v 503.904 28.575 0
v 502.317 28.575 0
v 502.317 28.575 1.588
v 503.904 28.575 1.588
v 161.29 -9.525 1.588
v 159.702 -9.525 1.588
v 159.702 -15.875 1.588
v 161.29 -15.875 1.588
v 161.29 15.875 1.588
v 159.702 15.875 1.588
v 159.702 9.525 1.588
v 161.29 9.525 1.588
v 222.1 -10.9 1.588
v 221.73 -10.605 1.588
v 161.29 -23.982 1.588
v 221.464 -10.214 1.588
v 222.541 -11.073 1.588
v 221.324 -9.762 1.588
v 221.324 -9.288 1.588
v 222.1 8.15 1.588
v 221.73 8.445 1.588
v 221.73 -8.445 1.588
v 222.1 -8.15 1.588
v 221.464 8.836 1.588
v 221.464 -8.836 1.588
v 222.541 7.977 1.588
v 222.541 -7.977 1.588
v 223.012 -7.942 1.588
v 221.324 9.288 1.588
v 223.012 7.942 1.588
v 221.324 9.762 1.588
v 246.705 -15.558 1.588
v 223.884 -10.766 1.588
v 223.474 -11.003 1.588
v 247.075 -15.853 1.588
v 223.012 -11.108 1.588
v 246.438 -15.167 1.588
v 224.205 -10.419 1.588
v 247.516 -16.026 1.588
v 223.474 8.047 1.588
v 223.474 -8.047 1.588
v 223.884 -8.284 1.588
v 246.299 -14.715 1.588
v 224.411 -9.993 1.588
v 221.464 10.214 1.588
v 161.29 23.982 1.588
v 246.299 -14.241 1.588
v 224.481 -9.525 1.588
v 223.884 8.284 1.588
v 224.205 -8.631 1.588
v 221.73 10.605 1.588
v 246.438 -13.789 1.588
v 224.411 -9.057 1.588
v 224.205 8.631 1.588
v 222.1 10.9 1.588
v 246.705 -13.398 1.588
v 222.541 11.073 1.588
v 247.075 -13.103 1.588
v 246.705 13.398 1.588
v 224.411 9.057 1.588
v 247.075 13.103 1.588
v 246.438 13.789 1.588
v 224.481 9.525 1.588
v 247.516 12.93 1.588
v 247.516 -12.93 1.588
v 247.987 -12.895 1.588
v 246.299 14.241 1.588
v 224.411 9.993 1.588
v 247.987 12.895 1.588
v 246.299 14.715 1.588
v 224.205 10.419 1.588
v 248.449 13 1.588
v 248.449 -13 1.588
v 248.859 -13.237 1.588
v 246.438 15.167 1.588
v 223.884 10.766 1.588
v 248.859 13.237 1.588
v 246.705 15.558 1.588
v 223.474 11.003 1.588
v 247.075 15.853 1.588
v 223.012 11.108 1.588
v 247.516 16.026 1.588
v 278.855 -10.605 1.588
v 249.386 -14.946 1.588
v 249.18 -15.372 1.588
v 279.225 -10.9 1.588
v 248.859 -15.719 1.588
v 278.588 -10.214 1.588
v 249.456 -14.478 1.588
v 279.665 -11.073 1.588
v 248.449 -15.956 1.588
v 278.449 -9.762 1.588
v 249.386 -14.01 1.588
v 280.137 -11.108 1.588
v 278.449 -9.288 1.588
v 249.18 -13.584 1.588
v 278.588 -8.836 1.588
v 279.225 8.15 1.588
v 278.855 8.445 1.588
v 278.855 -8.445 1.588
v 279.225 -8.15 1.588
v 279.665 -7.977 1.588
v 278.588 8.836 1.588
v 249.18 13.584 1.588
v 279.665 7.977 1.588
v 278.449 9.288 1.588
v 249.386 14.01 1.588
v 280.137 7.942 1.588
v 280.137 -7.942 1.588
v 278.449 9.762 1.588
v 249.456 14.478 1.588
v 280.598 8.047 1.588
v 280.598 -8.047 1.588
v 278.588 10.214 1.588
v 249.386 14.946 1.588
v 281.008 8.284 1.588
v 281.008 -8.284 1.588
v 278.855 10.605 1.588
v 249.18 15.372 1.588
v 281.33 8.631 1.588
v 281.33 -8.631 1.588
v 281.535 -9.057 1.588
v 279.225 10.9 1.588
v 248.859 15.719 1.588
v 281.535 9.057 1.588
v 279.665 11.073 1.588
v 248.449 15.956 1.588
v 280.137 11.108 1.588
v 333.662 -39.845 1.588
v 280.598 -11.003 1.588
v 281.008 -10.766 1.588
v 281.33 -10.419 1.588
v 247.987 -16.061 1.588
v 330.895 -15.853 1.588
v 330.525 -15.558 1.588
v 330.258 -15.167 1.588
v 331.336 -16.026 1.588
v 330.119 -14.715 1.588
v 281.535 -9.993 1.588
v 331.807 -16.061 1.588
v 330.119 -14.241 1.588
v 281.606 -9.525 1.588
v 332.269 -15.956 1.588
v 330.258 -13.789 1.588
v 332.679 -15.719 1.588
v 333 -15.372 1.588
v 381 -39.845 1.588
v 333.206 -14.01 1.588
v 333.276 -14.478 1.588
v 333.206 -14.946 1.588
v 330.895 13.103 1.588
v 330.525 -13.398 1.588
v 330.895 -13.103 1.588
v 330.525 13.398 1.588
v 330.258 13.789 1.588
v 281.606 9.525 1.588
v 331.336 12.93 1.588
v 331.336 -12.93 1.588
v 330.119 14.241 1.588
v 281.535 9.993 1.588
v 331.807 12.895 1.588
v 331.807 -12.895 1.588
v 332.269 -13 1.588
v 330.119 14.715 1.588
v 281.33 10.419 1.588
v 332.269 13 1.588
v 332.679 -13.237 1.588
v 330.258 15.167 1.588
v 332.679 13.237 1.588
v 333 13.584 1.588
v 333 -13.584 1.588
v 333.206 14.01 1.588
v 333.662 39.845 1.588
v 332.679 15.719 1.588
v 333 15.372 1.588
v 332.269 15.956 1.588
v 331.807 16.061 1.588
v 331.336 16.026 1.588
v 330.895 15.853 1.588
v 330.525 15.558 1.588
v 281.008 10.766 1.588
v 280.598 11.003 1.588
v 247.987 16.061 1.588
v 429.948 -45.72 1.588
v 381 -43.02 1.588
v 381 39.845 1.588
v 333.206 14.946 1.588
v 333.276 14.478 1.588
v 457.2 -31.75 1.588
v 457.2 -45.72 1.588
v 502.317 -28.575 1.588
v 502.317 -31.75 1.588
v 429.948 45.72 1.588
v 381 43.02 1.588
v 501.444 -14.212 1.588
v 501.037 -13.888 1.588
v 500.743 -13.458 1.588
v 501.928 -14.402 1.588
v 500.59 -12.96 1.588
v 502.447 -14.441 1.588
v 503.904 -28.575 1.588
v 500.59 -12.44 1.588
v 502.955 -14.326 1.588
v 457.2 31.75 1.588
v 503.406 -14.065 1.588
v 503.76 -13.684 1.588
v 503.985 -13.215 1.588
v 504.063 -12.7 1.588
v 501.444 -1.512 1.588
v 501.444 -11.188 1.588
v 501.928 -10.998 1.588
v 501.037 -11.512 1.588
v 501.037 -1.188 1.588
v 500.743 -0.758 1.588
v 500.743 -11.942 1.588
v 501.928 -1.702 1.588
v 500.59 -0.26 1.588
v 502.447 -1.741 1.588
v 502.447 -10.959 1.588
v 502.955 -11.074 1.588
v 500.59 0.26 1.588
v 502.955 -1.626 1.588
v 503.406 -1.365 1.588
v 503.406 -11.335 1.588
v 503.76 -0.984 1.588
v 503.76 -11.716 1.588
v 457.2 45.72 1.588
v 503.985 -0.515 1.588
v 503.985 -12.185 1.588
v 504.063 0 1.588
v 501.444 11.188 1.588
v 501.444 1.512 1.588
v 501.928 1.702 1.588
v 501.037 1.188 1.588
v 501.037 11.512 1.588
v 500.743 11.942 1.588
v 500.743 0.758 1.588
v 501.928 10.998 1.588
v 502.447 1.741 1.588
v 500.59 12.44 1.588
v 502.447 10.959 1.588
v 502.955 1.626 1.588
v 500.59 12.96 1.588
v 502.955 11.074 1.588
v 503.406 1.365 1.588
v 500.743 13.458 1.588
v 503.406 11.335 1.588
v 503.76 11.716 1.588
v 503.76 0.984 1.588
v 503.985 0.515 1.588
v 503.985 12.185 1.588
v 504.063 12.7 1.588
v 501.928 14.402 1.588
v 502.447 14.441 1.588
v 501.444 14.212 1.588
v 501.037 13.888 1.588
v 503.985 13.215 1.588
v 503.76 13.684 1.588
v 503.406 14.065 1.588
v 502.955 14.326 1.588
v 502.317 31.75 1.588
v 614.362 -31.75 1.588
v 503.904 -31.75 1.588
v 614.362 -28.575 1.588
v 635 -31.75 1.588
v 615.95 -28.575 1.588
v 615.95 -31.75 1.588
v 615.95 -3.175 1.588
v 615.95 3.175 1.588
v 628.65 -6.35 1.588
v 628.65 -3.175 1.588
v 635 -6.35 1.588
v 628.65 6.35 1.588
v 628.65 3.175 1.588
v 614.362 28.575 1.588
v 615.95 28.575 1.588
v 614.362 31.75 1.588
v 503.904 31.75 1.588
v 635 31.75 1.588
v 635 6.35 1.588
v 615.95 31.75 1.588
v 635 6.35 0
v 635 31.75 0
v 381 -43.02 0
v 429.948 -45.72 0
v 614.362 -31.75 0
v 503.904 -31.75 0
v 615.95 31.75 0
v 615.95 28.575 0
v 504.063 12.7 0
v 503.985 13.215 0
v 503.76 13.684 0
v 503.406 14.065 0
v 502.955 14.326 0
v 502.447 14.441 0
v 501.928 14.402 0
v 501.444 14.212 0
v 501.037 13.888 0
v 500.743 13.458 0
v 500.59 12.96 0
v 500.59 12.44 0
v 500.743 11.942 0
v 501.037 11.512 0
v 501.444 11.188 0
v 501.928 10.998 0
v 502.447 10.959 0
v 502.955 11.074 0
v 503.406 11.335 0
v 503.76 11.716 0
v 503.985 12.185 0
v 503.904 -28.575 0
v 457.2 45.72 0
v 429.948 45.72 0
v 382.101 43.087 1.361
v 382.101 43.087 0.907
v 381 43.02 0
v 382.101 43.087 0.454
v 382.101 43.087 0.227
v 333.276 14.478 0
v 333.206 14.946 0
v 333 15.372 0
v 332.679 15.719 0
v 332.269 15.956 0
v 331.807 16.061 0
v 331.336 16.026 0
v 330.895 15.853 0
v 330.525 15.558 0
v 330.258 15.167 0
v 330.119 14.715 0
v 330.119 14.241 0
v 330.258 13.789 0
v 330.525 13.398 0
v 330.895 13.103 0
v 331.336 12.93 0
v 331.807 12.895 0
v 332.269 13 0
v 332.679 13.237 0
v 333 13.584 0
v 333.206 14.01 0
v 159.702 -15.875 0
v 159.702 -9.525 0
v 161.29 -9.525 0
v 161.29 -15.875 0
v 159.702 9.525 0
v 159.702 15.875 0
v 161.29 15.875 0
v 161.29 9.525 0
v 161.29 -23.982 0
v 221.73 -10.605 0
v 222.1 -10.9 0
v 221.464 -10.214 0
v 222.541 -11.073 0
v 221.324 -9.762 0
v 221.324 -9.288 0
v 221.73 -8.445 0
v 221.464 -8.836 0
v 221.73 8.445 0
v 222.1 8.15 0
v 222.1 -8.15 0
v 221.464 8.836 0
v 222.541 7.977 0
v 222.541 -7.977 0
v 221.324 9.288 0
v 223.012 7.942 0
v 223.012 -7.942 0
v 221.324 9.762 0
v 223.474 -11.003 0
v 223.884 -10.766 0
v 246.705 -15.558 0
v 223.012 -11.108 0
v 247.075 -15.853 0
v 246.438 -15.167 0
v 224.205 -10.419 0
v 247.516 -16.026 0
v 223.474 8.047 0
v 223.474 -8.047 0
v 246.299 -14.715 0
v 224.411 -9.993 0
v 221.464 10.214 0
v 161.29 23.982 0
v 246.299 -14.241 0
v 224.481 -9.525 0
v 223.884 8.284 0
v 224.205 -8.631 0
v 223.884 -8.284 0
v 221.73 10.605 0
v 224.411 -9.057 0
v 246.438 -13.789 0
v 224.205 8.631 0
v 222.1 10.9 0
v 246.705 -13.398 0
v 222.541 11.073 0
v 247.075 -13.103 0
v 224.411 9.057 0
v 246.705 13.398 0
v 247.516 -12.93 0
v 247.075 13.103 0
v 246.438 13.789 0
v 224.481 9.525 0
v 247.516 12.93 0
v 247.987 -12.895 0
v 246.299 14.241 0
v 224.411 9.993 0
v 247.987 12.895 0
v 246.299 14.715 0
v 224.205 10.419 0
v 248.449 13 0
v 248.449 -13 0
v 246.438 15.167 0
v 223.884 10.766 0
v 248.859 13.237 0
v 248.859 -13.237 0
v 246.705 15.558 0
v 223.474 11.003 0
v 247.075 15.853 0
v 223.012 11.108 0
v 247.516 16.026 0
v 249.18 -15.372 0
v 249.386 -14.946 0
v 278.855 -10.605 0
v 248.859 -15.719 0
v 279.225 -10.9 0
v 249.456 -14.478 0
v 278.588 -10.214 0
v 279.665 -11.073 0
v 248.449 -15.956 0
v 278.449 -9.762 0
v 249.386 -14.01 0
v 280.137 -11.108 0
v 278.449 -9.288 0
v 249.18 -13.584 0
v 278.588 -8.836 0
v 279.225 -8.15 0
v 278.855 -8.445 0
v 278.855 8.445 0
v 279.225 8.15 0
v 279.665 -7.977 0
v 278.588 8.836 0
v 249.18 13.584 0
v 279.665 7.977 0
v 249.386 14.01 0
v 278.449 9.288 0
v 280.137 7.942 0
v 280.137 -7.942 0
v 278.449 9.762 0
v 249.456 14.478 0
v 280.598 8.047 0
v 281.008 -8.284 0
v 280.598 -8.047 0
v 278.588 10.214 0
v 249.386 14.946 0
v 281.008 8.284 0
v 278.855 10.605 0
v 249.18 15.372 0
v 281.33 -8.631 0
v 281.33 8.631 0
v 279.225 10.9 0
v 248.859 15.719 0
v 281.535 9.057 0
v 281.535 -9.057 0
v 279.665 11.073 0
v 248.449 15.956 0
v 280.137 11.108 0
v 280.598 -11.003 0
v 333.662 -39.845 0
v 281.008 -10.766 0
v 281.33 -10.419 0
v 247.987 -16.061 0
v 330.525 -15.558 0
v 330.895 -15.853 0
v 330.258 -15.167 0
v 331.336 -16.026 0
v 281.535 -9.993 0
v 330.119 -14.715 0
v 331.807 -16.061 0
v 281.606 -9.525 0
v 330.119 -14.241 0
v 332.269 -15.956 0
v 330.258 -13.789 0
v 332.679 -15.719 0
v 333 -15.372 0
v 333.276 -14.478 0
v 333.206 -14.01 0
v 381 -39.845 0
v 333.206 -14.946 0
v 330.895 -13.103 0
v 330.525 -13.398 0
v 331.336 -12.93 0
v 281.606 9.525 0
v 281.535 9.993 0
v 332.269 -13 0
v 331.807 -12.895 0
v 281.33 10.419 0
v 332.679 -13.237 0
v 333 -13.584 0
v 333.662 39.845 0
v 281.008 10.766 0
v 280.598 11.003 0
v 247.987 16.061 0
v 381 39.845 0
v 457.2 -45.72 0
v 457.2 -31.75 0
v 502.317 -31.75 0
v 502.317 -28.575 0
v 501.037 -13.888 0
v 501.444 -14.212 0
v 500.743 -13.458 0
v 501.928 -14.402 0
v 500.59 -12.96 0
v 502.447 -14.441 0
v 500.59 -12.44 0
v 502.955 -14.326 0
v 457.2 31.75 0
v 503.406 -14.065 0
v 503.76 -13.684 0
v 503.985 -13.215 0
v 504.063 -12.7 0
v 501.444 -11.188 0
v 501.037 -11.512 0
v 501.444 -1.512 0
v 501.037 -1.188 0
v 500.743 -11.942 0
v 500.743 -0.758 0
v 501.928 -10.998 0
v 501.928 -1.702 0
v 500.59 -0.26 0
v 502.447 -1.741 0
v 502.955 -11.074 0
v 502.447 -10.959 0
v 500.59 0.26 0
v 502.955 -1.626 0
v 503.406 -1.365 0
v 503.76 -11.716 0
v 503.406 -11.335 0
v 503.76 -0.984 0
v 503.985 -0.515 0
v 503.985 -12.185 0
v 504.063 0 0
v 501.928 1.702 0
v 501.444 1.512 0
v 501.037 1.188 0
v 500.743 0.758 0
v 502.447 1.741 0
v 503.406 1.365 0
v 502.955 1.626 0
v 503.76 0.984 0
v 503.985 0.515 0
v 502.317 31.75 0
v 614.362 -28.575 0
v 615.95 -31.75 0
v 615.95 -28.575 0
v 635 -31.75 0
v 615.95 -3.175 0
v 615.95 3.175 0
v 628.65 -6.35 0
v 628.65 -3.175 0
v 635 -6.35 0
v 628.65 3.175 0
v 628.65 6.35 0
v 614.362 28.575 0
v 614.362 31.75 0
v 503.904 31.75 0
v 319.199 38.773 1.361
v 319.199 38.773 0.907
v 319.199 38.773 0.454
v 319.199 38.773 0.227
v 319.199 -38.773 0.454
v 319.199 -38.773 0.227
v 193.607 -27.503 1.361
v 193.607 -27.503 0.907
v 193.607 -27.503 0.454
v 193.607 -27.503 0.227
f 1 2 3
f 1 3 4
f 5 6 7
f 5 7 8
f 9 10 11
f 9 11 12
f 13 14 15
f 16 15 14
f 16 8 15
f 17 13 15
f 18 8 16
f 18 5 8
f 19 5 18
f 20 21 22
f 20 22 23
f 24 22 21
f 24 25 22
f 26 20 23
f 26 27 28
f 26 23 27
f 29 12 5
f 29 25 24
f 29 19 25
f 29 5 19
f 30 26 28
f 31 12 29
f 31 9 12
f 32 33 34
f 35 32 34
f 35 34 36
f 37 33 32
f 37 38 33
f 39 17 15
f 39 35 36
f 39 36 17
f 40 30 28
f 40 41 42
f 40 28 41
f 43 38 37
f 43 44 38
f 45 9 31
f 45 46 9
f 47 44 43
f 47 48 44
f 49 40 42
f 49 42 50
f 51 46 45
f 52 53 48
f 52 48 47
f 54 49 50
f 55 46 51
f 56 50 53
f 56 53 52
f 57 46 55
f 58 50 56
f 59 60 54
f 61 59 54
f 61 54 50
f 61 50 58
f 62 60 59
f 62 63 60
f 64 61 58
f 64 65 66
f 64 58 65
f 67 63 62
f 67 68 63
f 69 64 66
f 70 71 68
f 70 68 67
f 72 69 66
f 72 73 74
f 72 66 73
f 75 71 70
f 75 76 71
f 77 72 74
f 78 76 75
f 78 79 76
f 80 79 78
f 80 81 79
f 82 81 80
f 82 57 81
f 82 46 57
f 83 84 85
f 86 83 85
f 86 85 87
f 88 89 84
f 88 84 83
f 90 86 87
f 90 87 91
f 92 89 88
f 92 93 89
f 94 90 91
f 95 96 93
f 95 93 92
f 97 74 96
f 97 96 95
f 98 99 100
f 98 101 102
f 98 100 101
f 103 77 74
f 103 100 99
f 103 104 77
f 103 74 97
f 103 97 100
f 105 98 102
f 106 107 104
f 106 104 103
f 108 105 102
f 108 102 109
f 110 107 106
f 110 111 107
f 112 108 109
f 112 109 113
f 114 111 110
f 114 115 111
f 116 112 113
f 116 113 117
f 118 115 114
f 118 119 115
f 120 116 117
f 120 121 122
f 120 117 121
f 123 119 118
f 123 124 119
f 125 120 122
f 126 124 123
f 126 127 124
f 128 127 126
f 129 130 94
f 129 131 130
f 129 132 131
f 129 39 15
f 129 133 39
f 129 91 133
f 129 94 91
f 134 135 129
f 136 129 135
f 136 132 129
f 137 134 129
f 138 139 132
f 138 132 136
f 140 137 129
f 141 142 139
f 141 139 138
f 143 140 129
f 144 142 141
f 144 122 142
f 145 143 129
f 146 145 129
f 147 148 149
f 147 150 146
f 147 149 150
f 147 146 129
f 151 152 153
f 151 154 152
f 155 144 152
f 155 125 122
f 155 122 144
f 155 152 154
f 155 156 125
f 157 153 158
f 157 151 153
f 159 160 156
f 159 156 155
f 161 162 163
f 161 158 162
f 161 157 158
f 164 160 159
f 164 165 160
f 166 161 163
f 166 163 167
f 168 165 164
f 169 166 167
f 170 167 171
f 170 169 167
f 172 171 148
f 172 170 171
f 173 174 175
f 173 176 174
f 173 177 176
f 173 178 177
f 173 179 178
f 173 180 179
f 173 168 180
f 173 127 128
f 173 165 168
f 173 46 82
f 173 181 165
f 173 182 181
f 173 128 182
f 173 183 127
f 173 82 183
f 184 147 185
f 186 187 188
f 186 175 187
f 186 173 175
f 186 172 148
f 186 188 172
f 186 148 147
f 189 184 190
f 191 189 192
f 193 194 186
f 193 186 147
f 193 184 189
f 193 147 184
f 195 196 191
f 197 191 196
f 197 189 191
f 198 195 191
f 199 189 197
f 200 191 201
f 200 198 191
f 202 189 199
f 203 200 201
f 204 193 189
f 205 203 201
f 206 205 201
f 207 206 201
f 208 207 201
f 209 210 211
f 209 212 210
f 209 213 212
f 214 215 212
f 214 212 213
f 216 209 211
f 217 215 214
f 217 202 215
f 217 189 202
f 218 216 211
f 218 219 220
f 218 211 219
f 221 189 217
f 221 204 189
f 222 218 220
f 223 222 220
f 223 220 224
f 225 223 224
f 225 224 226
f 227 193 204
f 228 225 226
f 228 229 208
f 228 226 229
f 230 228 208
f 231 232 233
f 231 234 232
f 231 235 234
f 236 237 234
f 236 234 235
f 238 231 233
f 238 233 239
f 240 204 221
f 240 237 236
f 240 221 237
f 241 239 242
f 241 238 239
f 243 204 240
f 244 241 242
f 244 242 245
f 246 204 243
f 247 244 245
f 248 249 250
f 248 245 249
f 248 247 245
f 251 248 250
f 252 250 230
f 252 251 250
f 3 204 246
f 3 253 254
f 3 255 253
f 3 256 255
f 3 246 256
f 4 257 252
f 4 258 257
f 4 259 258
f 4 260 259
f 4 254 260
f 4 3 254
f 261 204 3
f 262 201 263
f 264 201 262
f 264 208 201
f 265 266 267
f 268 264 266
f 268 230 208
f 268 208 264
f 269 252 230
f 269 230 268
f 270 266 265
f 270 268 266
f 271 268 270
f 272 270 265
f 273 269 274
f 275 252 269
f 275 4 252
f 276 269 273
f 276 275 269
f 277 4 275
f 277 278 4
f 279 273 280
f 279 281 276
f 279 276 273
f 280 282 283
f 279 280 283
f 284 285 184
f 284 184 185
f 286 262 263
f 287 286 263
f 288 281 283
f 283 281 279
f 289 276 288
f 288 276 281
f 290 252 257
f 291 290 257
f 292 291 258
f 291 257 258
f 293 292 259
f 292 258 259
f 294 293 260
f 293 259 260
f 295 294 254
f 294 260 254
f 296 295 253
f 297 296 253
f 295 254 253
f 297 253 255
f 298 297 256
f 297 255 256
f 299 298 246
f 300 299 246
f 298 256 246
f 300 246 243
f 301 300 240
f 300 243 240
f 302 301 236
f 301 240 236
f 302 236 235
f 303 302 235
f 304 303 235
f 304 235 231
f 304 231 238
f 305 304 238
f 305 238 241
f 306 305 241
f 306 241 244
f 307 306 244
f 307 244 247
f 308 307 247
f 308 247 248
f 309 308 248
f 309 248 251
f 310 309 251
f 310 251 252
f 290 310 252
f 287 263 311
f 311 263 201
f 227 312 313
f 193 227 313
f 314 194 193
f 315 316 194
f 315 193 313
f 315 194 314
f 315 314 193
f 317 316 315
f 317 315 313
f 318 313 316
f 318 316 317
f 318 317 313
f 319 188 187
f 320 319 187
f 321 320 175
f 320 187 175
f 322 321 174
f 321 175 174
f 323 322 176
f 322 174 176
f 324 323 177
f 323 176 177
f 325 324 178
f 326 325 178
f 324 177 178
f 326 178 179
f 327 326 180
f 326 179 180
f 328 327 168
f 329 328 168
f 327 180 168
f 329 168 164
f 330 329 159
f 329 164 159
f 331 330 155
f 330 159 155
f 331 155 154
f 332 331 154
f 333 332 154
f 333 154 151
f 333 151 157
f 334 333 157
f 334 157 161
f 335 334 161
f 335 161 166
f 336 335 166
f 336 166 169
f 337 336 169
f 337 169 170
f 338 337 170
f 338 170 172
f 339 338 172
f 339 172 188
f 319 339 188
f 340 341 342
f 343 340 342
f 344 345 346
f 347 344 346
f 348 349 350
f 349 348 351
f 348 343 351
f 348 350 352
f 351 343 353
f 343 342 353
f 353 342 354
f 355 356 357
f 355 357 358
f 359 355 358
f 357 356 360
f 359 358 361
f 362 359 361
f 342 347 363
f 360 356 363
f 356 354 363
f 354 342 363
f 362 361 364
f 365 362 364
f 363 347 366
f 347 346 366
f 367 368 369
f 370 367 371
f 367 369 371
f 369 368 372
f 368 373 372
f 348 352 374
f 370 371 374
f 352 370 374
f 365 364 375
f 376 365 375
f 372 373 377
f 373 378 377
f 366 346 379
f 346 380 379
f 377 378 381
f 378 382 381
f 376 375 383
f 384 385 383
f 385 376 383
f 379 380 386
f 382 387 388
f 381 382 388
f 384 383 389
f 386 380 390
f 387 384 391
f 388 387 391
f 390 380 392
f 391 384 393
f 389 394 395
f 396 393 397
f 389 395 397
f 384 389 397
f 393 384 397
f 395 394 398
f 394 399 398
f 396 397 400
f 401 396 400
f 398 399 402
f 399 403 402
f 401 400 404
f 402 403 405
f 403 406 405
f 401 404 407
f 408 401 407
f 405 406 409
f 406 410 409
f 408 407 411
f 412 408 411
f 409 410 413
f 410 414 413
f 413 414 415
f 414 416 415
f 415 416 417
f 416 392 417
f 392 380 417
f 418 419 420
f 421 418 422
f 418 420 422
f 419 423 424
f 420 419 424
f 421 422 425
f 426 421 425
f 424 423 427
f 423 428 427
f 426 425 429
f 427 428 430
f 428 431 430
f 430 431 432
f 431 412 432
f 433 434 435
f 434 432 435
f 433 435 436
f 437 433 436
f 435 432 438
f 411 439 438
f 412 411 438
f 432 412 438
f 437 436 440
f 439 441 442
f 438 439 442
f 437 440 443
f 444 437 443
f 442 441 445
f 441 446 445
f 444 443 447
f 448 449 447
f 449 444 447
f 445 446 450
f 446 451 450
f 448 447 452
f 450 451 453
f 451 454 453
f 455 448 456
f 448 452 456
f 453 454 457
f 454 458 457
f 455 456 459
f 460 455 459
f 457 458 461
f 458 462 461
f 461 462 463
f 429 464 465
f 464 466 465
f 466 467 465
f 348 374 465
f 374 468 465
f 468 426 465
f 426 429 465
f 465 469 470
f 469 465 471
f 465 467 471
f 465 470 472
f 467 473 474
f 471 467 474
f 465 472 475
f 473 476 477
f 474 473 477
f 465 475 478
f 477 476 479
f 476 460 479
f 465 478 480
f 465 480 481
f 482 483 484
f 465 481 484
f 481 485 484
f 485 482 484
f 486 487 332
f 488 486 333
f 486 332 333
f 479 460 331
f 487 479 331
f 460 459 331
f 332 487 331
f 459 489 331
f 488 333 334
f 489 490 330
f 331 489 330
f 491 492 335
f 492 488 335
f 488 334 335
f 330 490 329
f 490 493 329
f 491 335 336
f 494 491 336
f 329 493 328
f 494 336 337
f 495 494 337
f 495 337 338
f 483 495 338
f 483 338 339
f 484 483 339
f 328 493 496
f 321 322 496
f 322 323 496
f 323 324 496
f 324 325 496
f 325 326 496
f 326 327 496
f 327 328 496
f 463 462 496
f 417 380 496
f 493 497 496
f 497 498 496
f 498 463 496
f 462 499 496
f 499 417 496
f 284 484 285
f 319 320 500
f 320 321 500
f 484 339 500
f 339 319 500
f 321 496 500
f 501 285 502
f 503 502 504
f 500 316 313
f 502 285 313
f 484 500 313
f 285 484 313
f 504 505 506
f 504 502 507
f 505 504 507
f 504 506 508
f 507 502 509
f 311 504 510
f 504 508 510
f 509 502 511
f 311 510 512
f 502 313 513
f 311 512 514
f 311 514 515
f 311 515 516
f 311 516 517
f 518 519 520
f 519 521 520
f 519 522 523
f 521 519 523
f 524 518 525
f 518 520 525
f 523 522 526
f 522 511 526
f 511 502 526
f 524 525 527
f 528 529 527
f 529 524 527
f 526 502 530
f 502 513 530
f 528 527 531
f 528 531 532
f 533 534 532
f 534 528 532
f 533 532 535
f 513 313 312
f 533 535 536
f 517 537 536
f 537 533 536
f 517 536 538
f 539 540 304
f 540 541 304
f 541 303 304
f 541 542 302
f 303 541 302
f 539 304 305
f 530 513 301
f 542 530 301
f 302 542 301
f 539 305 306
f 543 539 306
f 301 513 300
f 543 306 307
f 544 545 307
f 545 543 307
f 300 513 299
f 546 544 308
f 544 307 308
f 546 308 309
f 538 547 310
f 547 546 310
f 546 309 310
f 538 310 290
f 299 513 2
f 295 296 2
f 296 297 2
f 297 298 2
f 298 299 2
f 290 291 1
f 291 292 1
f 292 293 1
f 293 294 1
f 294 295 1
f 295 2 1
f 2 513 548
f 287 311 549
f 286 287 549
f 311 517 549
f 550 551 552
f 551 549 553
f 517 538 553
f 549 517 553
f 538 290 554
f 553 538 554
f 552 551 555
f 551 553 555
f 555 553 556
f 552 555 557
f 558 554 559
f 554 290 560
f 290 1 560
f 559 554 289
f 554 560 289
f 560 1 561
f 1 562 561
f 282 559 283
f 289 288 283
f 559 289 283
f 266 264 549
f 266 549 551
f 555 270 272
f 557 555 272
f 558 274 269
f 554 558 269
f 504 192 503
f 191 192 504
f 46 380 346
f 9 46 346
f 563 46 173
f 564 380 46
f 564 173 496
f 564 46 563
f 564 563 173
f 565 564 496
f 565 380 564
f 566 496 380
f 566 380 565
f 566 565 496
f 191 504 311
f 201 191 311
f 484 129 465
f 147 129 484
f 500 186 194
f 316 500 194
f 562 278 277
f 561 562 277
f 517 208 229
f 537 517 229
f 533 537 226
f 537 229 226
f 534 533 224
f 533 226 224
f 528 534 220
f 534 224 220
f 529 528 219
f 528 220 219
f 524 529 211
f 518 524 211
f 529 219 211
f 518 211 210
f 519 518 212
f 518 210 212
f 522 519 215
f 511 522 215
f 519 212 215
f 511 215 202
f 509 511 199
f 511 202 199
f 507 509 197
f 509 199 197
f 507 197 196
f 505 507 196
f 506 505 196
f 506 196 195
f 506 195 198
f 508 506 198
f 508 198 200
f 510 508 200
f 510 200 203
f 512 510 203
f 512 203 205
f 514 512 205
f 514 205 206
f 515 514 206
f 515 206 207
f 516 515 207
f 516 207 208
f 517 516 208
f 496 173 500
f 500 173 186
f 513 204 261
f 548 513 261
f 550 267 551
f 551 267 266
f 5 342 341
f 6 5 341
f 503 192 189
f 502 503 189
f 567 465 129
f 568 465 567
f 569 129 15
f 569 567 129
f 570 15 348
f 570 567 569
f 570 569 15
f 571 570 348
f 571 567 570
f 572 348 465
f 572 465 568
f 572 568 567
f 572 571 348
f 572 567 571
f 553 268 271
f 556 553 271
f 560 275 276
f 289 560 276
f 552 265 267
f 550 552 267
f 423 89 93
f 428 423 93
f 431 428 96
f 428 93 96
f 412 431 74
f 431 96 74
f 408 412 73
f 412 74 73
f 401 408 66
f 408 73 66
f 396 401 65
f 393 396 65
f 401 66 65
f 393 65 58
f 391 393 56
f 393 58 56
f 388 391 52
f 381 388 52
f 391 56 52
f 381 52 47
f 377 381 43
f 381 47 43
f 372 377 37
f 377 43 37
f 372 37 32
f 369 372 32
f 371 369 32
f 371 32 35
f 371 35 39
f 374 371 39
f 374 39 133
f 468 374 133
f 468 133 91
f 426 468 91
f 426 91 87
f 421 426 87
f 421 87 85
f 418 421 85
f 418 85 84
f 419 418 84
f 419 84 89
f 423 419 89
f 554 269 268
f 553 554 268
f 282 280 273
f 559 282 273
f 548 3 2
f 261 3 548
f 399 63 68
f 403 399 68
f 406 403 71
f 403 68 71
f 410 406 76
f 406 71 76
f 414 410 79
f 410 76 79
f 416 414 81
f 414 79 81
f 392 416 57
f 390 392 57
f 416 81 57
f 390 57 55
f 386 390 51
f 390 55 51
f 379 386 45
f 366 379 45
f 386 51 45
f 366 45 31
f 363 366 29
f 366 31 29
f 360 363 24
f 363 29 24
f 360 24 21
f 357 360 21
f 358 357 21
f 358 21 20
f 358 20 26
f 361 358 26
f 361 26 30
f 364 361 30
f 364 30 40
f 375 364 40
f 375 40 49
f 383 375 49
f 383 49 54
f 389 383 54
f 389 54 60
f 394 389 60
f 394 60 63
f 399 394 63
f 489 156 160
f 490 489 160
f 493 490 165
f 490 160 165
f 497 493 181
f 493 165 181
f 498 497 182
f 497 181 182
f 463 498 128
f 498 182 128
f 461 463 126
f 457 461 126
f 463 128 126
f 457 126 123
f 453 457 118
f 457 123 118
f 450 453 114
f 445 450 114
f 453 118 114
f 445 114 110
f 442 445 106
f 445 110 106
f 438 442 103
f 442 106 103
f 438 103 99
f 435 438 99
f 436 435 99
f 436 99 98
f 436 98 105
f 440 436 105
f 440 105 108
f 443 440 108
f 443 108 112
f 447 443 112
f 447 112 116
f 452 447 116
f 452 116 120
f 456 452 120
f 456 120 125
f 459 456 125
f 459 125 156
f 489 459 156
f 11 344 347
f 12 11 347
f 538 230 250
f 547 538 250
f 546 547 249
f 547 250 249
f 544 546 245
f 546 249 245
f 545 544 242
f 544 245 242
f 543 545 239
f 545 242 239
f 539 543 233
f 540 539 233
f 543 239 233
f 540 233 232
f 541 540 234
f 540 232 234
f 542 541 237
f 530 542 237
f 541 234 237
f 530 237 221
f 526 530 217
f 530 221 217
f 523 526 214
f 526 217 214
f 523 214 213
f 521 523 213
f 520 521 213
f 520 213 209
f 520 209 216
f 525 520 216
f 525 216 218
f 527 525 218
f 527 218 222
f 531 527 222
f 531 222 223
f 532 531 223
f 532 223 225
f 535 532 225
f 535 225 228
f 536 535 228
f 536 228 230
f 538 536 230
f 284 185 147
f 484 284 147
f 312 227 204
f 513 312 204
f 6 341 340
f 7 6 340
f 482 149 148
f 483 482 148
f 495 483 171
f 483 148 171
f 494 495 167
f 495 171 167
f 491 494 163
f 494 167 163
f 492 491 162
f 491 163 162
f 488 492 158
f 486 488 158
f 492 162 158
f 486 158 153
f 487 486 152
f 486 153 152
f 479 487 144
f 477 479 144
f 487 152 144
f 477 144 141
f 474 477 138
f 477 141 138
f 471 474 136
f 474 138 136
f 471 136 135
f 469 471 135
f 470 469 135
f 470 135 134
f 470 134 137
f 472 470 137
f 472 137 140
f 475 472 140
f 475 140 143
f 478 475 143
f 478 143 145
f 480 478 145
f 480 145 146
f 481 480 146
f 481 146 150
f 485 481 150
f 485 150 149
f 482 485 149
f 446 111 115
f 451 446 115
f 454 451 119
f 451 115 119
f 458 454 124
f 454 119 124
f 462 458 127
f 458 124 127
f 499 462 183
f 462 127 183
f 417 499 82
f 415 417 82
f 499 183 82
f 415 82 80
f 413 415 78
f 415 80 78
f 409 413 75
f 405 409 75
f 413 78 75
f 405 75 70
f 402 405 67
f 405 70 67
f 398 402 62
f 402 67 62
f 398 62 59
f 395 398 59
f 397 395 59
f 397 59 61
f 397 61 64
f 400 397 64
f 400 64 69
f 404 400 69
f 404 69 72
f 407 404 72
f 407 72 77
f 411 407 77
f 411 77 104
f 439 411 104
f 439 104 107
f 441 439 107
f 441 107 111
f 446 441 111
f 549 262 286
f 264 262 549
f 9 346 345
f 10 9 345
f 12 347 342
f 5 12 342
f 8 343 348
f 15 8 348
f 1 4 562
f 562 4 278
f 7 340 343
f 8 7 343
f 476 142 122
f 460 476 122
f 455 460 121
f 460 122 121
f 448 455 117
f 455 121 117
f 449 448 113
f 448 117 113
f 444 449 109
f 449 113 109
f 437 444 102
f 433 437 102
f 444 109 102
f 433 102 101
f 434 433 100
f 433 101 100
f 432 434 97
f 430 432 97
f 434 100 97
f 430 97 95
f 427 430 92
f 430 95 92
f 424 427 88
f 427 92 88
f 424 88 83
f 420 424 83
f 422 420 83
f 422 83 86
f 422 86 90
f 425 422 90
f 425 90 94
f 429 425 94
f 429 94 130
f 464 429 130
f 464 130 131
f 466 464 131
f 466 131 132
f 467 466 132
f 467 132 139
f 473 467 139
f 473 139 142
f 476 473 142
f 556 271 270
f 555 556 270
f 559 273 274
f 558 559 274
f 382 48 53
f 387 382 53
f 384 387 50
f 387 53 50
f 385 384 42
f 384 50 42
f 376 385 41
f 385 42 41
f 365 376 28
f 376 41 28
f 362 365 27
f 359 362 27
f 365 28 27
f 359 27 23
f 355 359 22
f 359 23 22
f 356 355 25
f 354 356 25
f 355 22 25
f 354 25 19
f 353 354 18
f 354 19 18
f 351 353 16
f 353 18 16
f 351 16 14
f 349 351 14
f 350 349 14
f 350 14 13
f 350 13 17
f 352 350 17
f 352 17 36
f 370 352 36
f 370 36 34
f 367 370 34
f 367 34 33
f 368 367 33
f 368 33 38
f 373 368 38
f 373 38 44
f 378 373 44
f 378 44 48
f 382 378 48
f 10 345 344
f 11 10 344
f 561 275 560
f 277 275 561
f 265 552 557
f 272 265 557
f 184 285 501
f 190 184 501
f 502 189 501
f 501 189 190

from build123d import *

# Parameters (mm, degrees)
BOSS_EXTRUDE1_DEPTH    = 1.5875
CUT_EXTRUDE1_DEPTH     = 637.645771754
SKETCH4_W              = 1.5875
SKETCH4_H              = 3.175
CUT_EXTRUDE2_DEPTH     = 637.645771754
SKETCH6_W              = 47.338109293
SKETCH6_H              = 3.175
CUT_EXTRUDE3_DEPTH     = 637.645771754
SKETCH7_R              = 1.5875
ARTS4_MOUNT_DEPTH      = 637.645771754
SKETCH8_R              = 1.5875
TELEMETRUM_MOUNT_DEPTH = 637.645771754
SKETCH9_R              = 1.74625
CUT_EXTRUDE4_DEPTH     = 637.645771754


with BuildPart() as part:
    # Sketch1 → Boss-Extrude1 (new body)
    with BuildSketch(Plane.XY):
        with BuildLine():
            Line((508, -45.72), (508, -34.29))
            Line((508, -34.29), (635, -34.29))
            Line((635, -34.29), (635, 34.29))
            Line((635, 34.29), (508, 34.29))
            Line((508, 34.29), (508, 45.72))
            Line((508, 45.72), (429.947642932, 45.72))
            add(Edge.make_bspline(
                [(161.29, 23.981640211), (161.616784041, 24.018741883), (172.383373415, 25.239568053), (204.048179593, 28.679227521), (256.348102033, 33.727983978), (319.188209115, 38.915614913), (371.60802888, 42.52482202), (408.536828327, 44.644949518), (424.488578703, 45.455997775), (429.947642932, 45.72)],
                knots=[0.31962734, 0.31962734, 0.31962734, 0.31962734, 0.321557959, 0.383234508, 0.506587607, 0.629940705, 0.753293803, 0.814970352, 0.847054623, 0.847054623, 0.847054623, 0.847054623], degree=3))
            Line((161.29, 23.981640211), (161.29, 15.875))
            Line((161.29, 15.875), (159.7025, 15.875))
            Line((159.7025, 15.875), (159.7025, 9.525))
            Line((159.7025, 9.525), (161.29, 9.525))
            Line((161.29, 9.525), (161.29, -9.525))
            Line((161.29, -9.525), (159.7025, -9.525))
            Line((159.7025, -9.525), (159.7025, -15.875))
            Line((159.7025, -15.875), (161.29, -15.875))
            Line((161.29, -15.875), (161.29, -23.981640211))
            add(Edge.make_bspline(
                [(429.947642932, -45.72), (424.488578703, -45.455997775), (408.536828327, -44.644949518), (371.60802888, -42.52482202), (319.188209115, -38.915614913), (256.348102033, -33.727983978), (204.048179593, -28.679227521), (172.383373415, -25.239568053), (161.616784041, -24.018741883), (161.29, -23.981640211)],
                knots=[0.16612059, 0.16612059, 0.16612059, 0.16612059, 0.198204861, 0.25988141, 0.383234508, 0.506587607, 0.629940705, 0.691617254, 0.693547873, 0.693547873, 0.693547873, 0.693547873], degree=3))
            Line((429.947642932, -45.72), (508, -45.72))
        make_face()
    extrude(amount=BOSS_EXTRUDE1_DEPTH)

    # Sketch3 → Cut-Extrude1 (cut, through all)
    with BuildSketch(Plane.XY.offset(1.5875)):
        Polygon((635, 34.29), (508, 34.29), (508, 45.72), (457.2, 45.72), (457.2, 31.75), (635, 31.75), align=None)
        Polygon((508, -45.72), (508, -34.29), (635, -34.29), (635, -31.75), (457.2, -31.75), (457.2, -45.72), align=None)
        Polygon((628.65, 6.35), (628.65, 3.175), (615.95, 3.175), (615.95, -3.175), (628.65, -3.175), (628.65, -6.35), (635, -6.35), (635, 6.35), align=None)
    extrude(amount=-CUT_EXTRUDE1_DEPTH, mode=Mode.SUBTRACT)

    # Sketch4 → Cut-Extrude2 (cut, through all)
    with BuildSketch(Plane.XY.offset(1.5875)):
        with Locations((503.1105, 30.1625)):
            Rectangle(SKETCH4_W, SKETCH4_H)
        with Locations((615.15625, 30.1625)):
            Rectangle(SKETCH4_W, SKETCH4_H)
        with Locations((503.1105, -30.1625)):
            Rectangle(SKETCH4_W, SKETCH4_H)
        with Locations((615.15625, -30.1625)):
            Rectangle(SKETCH4_W, SKETCH4_H)
    extrude(amount=-CUT_EXTRUDE2_DEPTH, mode=Mode.SUBTRACT)

    # Sketch6 → Cut-Extrude3 (cut, through all)
    with BuildSketch(Plane.XY.offset(1.5875)):
        with Locations((357.330945353, 41.432202354)):
            Rectangle(SKETCH6_W, SKETCH6_H)
        with Locations((357.330945353, -41.432202354)):
            Rectangle(SKETCH6_W, SKETCH6_H)
    extrude(amount=-CUT_EXTRUDE3_DEPTH, mode=Mode.SUBTRACT)

    # Sketch7 → ARTS4 mount (cut, through all)
    with BuildSketch(Plane.XY.offset(1.5875)):
        with Locations((331.688780886, 14.478)):
            Circle(SKETCH7_R)
        with Locations((331.688780886, -14.478)):
            Circle(SKETCH7_R)
        with Locations((247.868780886, 14.478)):
            Circle(SKETCH7_R)
        with Locations((247.868780886, -14.478)):
            Circle(SKETCH7_R)
    extrude(amount=-ARTS4_MOUNT_DEPTH, mode=Mode.SUBTRACT)

    # Sketch8 → Telemetrum Mount (cut, through all)
    with BuildSketch(Plane.XY.offset(1.5875)):
        with Locations((280.018433255, 9.525)):
            Circle(SKETCH8_R)
        with Locations((280.018433255, -9.525)):
            Circle(SKETCH8_R)
        with Locations((222.893833255, -9.525)):
            Circle(SKETCH8_R)
        with Locations((222.893833255, 9.525)):
            Circle(SKETCH8_R)
    extrude(amount=-TELEMETRUM_MOUNT_DEPTH, mode=Mode.SUBTRACT)

    # Sketch9 → Cut-Extrude4 (cut, through all)
    with BuildSketch(Plane.XY.offset(1.5875)):
        with Locations((502.31675, -12.7)):
            Circle(SKETCH9_R)
        with Locations((502.31675, 12.7)):
            Circle(SKETCH9_R)
        with Locations((502.31675, 0)):
            Circle(SKETCH9_R)
    extrude(amount=-CUT_EXTRUDE4_DEPTH, mode=Mode.SUBTRACT)


solid = part.part
